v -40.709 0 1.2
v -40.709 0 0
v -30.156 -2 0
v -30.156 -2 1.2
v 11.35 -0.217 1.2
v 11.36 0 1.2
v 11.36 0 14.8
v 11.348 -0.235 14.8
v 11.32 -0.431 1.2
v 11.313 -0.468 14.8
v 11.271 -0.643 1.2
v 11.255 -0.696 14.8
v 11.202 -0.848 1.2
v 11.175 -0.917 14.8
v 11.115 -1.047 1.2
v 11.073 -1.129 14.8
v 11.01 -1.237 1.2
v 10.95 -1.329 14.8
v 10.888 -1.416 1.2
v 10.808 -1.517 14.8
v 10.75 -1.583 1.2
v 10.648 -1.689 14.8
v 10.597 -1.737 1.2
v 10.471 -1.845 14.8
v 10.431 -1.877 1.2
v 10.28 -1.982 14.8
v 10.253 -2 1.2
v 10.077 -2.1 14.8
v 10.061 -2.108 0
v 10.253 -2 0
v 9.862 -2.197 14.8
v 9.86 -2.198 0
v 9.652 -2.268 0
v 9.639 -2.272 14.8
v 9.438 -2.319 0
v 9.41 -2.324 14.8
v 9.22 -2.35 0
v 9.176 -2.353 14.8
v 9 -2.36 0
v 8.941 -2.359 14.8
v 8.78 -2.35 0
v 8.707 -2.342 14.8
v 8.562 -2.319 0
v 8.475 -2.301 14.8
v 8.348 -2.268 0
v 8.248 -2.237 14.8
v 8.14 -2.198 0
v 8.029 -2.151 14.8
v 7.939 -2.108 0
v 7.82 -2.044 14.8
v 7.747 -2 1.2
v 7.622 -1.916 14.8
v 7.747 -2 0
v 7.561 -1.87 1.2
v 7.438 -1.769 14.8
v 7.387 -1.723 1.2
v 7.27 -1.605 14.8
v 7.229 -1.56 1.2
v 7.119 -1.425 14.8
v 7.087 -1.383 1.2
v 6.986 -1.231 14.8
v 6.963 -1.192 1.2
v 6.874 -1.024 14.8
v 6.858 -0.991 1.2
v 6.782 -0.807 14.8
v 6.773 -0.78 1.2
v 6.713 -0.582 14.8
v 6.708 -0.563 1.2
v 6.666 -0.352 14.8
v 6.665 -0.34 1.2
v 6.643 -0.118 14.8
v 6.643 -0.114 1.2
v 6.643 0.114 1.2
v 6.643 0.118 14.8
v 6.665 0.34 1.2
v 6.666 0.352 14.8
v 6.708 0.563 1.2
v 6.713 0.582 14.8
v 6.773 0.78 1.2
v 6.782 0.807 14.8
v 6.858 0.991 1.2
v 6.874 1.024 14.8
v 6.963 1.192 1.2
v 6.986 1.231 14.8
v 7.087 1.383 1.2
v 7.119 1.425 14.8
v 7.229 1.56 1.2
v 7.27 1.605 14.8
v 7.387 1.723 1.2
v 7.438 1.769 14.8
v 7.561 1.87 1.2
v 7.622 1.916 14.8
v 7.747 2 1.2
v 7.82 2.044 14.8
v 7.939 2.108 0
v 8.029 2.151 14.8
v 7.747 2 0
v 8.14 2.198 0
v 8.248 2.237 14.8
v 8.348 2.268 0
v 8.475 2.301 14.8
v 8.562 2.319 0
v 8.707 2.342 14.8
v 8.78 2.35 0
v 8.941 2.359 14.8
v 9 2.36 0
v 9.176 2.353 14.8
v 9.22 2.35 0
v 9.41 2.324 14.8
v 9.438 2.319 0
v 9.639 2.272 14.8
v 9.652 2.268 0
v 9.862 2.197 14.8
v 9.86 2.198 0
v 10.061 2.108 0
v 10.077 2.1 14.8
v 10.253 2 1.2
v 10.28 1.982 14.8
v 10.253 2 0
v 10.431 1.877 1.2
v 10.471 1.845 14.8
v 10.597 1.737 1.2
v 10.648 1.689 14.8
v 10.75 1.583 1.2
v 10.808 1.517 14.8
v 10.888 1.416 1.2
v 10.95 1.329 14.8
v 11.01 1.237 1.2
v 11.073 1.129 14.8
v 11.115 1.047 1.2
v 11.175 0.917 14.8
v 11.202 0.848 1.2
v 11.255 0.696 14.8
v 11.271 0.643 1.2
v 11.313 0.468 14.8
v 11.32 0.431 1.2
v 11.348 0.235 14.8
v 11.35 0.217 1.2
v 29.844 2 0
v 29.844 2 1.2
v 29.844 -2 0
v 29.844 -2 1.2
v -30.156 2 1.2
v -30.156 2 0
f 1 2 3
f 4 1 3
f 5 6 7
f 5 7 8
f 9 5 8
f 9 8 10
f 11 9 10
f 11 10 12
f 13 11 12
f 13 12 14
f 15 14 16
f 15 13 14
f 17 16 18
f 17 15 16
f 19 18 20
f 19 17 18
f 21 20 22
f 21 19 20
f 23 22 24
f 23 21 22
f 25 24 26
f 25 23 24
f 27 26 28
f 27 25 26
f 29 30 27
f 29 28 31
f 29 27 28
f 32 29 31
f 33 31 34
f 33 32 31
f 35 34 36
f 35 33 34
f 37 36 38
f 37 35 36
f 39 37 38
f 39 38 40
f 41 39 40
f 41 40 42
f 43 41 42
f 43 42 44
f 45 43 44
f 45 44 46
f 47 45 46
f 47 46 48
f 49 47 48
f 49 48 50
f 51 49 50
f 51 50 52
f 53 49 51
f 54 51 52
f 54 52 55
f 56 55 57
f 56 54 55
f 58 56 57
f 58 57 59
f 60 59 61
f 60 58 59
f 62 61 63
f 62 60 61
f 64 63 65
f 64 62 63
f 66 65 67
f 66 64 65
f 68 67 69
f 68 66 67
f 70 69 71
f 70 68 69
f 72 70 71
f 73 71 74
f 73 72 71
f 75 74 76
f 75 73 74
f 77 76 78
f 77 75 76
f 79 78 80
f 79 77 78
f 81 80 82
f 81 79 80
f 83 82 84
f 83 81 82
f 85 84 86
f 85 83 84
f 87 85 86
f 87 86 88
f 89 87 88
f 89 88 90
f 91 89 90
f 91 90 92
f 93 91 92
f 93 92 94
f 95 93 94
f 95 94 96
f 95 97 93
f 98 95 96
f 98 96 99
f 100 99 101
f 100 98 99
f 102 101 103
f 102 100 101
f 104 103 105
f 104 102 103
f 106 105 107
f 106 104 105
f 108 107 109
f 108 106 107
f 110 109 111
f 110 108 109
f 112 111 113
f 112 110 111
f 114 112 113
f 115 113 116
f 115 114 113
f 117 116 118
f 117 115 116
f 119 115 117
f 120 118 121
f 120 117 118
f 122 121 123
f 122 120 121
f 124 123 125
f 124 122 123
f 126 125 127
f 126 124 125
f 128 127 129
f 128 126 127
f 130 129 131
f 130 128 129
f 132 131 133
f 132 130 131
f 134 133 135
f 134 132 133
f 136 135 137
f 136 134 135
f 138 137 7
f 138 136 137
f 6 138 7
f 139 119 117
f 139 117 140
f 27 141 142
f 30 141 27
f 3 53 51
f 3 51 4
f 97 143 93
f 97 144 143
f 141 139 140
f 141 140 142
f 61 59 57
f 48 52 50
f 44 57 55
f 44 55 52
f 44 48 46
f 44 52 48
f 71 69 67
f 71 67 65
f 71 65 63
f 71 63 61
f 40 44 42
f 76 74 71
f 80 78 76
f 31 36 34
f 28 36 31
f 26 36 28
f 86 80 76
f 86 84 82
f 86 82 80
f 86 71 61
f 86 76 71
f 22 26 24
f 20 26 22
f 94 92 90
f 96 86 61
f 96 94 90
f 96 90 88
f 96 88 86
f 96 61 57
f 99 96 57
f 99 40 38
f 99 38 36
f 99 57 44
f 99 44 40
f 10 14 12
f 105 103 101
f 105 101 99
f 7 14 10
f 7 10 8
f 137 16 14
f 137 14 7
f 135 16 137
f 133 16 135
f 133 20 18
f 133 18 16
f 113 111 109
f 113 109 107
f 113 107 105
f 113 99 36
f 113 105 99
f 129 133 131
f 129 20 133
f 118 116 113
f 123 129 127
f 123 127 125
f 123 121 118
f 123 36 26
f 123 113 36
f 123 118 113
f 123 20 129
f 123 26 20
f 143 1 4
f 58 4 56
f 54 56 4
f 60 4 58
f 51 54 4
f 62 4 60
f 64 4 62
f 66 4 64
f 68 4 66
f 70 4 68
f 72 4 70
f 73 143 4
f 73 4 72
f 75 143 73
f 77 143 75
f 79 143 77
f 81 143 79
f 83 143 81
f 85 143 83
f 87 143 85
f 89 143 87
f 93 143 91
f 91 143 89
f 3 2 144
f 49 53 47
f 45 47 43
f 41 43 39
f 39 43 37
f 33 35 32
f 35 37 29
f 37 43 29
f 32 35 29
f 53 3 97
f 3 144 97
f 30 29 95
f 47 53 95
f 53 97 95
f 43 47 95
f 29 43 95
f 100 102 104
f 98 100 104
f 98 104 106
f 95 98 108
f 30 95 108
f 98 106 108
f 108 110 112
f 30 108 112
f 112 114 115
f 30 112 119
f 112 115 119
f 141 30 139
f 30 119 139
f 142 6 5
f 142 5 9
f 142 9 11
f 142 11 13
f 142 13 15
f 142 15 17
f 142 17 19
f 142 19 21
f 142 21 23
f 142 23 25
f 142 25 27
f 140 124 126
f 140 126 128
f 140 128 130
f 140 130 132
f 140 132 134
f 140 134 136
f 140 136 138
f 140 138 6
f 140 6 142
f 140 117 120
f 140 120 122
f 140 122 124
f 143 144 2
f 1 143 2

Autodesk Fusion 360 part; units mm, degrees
sketch "草图1" plane through (0, 0, 0) normal (0, 0, 1) x (1, 0, 0)
  line L0 (29.8435, -2) -> (-30.1565, -2)
  line L1 (-30.1565, -2) -> (-30.1565, 2)
  line L2 (-30.1565, 2) -> (29.8435, 2)
  line L3 (29.8435, 2) -> (29.8435, -2)
  line L4 (-30.1565, 2) -> (-40.7091, 0)
  line L5 (-40.7091, 0) -> (-30.1565, -2)
  point P0 (-0.1565, 0)
  dimension "d1" = 60
  dimension "d2" = 4
extrude "拉伸1" add sketch "草图1" along normal blind 1.2
sketch "草图2" plane through (0, 0, 0) normal (0, 0, 1) x (1, 0, 0)
  circle A0 centre (9, 0) radius 2.36
  dimension "d5" = 4.72
extrude "拉伸2" add sketch "草图2" along normal blind 14.8
